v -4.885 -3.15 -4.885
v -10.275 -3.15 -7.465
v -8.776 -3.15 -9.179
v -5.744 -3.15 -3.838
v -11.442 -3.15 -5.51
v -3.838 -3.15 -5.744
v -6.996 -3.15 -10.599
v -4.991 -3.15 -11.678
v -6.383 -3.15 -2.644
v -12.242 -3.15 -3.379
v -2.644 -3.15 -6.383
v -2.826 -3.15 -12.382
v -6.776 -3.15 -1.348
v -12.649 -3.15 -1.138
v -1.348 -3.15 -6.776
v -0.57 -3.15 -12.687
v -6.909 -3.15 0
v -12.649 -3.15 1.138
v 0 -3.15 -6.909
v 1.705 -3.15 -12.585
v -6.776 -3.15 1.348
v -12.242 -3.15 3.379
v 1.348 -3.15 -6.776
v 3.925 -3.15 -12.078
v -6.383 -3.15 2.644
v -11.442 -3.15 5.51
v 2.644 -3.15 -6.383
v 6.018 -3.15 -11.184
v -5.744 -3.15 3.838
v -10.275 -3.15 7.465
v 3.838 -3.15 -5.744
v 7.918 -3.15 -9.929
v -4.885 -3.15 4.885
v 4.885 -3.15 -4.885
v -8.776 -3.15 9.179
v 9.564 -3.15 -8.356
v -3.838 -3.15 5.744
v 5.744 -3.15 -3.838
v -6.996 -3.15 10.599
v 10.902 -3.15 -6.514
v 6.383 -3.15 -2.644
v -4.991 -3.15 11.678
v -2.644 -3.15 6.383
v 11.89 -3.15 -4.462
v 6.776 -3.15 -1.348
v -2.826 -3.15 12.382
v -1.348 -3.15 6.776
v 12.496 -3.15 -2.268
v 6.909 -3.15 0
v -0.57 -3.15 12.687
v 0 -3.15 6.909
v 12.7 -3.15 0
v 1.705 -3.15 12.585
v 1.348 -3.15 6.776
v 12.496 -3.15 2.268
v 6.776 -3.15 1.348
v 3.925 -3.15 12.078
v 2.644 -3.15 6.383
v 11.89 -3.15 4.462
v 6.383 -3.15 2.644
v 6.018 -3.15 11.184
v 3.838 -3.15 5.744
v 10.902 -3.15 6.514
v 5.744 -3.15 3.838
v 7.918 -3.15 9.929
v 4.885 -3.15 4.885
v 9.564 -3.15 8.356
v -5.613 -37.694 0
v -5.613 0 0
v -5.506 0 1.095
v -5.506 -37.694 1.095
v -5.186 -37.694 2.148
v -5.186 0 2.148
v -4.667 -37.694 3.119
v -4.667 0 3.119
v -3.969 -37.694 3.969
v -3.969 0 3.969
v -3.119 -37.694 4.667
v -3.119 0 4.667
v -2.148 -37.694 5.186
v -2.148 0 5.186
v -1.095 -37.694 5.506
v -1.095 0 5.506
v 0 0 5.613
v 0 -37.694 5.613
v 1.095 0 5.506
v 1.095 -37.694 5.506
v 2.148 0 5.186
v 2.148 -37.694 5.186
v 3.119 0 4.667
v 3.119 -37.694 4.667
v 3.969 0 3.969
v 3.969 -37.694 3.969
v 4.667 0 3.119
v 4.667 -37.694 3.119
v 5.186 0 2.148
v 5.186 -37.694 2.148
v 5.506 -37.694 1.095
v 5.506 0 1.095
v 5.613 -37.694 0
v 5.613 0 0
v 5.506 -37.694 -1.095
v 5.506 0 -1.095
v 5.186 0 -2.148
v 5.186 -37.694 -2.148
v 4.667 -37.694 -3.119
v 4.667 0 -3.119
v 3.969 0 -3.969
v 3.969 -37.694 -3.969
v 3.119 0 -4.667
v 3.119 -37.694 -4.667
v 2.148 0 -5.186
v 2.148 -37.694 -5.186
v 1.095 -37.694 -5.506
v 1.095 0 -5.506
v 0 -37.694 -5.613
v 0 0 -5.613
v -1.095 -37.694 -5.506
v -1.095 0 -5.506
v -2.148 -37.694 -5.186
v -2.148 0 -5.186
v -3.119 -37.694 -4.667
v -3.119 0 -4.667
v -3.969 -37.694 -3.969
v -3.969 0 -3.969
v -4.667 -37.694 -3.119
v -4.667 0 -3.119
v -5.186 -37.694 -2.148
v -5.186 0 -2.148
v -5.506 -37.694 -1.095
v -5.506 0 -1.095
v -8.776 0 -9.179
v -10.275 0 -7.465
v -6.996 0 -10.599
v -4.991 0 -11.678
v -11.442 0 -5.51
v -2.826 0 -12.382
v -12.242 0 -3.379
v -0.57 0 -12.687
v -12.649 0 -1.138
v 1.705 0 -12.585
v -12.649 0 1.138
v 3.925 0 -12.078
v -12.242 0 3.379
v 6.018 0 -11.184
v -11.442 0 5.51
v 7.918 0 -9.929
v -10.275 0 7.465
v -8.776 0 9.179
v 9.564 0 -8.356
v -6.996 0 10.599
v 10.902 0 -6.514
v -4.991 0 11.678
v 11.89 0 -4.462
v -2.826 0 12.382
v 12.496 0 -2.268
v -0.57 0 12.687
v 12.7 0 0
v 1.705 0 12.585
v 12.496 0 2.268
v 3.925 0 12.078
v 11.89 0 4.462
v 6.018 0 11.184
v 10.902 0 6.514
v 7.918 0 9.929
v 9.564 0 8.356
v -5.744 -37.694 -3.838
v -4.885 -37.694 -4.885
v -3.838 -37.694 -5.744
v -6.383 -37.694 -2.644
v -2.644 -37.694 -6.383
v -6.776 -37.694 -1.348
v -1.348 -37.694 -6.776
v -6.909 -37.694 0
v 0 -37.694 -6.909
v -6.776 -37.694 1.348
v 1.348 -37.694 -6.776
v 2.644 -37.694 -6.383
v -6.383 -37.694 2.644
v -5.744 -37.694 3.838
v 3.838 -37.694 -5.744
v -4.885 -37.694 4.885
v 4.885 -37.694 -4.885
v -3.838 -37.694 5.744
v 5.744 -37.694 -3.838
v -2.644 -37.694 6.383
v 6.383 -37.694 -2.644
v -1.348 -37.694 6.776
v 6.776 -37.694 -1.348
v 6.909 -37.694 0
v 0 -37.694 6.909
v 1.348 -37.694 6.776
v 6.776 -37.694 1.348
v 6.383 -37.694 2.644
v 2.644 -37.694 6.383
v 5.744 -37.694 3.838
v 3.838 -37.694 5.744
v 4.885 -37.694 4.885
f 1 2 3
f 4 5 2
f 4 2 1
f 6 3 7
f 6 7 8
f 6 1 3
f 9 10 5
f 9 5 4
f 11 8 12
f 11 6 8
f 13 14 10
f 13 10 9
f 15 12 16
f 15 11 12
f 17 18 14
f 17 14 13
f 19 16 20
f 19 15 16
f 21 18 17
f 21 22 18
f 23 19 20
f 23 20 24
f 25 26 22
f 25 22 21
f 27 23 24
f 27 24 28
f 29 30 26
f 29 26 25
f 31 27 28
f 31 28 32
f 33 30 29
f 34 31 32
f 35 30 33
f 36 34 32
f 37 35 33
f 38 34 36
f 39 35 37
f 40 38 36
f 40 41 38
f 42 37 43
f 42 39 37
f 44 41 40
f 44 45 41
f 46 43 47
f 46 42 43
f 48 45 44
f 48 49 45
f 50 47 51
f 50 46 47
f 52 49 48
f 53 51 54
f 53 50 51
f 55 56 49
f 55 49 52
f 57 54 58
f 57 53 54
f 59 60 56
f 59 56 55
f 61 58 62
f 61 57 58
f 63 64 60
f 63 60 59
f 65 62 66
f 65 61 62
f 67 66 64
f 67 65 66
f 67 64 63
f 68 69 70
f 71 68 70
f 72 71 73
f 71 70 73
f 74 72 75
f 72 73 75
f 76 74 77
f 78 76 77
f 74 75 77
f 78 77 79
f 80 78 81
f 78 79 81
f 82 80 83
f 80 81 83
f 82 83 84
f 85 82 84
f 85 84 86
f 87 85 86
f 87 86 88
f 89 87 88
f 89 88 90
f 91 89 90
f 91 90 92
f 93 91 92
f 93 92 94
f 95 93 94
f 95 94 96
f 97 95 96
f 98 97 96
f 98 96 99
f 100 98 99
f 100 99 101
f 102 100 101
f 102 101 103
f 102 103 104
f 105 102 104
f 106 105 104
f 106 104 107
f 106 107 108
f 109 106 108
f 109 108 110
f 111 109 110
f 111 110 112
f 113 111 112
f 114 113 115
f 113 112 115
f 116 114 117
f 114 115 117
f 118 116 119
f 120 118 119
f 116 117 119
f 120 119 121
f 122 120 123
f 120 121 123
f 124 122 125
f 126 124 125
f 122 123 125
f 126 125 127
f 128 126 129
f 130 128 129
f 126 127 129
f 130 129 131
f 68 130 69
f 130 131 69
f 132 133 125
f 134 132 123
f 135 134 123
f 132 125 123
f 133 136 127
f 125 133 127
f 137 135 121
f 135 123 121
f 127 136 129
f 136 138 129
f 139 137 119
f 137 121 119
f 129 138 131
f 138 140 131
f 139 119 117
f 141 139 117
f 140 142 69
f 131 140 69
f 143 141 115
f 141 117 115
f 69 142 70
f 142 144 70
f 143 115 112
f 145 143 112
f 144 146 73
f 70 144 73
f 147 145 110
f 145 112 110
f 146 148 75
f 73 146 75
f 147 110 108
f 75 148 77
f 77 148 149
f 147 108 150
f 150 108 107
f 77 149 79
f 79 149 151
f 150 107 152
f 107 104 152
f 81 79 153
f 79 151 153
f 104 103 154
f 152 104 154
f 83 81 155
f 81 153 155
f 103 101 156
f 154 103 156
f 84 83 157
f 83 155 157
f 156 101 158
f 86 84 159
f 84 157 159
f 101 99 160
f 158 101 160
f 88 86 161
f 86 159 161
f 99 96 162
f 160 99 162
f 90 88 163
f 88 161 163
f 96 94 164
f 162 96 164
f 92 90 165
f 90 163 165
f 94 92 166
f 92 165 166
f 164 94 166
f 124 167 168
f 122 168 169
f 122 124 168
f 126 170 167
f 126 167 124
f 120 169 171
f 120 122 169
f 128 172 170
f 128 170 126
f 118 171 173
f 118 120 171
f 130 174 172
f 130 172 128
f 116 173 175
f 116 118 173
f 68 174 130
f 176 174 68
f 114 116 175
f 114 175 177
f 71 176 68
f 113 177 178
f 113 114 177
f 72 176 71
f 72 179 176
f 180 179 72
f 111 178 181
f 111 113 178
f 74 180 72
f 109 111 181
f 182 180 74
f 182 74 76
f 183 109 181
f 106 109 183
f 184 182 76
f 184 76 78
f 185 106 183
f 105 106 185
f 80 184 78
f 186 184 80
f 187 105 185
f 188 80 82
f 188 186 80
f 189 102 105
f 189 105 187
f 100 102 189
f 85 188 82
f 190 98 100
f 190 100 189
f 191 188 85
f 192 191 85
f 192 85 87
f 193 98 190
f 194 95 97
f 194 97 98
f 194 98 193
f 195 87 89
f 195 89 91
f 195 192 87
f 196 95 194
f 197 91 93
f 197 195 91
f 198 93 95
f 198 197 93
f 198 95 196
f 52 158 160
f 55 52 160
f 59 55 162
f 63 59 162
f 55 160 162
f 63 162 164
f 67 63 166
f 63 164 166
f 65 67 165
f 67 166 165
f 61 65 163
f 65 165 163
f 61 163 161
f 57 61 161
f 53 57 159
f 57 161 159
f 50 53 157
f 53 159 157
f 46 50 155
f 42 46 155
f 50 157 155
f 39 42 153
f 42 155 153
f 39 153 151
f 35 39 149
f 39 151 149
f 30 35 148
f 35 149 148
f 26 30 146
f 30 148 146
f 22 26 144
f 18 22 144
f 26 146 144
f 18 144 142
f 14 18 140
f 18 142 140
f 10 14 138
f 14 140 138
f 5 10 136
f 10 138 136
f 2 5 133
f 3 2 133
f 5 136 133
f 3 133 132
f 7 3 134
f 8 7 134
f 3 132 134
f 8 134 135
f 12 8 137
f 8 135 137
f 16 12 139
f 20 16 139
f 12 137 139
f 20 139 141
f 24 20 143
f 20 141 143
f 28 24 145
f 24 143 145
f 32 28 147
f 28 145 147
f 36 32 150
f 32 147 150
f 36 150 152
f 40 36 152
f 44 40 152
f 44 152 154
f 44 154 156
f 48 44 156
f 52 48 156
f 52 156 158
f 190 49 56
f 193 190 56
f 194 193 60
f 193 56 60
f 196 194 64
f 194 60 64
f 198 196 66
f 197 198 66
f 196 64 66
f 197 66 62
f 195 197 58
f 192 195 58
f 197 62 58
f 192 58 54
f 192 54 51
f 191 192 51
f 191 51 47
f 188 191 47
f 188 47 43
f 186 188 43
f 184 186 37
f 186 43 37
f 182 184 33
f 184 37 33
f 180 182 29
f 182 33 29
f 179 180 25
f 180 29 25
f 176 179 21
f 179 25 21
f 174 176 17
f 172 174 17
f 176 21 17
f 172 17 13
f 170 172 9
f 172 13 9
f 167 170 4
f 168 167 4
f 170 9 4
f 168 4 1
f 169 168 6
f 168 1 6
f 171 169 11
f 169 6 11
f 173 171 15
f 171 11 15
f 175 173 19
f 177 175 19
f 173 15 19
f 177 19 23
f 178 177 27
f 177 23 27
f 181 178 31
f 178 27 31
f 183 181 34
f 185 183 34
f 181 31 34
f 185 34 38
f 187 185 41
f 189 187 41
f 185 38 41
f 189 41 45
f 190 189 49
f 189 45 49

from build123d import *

# Parameters (mm, degrees)
F0_R     = 12.7
F1_DEPTH = 3.1496
F2_R     = 6.9088
F3_DEPTH = 34.544
F4_R     = 5.6134
F5_DEPTH = 37.6946


with BuildPart() as f1:
    # F0 (on Front) → F1 (new body)
    with BuildSketch(Plane.XZ):
        Circle(F0_R)
    extrude(amount=F1_DEPTH)

    # F2 (on face) → F3 (join)
    with BuildSketch(Plane.XZ.offset(3.1496)):
        Circle(F2_R)
    extrude(amount=F3_DEPTH)

    # F4 (on face) → F5 (cut, through all)
    with BuildSketch(Plane(origin=(0, 0, 0), x_dir=(-1, 0, 0), z_dir=(0, 1, 0))):
        Circle(F4_R)
    extrude(amount=-F5_DEPTH, mode=Mode.SUBTRACT)


solid = f1.part
